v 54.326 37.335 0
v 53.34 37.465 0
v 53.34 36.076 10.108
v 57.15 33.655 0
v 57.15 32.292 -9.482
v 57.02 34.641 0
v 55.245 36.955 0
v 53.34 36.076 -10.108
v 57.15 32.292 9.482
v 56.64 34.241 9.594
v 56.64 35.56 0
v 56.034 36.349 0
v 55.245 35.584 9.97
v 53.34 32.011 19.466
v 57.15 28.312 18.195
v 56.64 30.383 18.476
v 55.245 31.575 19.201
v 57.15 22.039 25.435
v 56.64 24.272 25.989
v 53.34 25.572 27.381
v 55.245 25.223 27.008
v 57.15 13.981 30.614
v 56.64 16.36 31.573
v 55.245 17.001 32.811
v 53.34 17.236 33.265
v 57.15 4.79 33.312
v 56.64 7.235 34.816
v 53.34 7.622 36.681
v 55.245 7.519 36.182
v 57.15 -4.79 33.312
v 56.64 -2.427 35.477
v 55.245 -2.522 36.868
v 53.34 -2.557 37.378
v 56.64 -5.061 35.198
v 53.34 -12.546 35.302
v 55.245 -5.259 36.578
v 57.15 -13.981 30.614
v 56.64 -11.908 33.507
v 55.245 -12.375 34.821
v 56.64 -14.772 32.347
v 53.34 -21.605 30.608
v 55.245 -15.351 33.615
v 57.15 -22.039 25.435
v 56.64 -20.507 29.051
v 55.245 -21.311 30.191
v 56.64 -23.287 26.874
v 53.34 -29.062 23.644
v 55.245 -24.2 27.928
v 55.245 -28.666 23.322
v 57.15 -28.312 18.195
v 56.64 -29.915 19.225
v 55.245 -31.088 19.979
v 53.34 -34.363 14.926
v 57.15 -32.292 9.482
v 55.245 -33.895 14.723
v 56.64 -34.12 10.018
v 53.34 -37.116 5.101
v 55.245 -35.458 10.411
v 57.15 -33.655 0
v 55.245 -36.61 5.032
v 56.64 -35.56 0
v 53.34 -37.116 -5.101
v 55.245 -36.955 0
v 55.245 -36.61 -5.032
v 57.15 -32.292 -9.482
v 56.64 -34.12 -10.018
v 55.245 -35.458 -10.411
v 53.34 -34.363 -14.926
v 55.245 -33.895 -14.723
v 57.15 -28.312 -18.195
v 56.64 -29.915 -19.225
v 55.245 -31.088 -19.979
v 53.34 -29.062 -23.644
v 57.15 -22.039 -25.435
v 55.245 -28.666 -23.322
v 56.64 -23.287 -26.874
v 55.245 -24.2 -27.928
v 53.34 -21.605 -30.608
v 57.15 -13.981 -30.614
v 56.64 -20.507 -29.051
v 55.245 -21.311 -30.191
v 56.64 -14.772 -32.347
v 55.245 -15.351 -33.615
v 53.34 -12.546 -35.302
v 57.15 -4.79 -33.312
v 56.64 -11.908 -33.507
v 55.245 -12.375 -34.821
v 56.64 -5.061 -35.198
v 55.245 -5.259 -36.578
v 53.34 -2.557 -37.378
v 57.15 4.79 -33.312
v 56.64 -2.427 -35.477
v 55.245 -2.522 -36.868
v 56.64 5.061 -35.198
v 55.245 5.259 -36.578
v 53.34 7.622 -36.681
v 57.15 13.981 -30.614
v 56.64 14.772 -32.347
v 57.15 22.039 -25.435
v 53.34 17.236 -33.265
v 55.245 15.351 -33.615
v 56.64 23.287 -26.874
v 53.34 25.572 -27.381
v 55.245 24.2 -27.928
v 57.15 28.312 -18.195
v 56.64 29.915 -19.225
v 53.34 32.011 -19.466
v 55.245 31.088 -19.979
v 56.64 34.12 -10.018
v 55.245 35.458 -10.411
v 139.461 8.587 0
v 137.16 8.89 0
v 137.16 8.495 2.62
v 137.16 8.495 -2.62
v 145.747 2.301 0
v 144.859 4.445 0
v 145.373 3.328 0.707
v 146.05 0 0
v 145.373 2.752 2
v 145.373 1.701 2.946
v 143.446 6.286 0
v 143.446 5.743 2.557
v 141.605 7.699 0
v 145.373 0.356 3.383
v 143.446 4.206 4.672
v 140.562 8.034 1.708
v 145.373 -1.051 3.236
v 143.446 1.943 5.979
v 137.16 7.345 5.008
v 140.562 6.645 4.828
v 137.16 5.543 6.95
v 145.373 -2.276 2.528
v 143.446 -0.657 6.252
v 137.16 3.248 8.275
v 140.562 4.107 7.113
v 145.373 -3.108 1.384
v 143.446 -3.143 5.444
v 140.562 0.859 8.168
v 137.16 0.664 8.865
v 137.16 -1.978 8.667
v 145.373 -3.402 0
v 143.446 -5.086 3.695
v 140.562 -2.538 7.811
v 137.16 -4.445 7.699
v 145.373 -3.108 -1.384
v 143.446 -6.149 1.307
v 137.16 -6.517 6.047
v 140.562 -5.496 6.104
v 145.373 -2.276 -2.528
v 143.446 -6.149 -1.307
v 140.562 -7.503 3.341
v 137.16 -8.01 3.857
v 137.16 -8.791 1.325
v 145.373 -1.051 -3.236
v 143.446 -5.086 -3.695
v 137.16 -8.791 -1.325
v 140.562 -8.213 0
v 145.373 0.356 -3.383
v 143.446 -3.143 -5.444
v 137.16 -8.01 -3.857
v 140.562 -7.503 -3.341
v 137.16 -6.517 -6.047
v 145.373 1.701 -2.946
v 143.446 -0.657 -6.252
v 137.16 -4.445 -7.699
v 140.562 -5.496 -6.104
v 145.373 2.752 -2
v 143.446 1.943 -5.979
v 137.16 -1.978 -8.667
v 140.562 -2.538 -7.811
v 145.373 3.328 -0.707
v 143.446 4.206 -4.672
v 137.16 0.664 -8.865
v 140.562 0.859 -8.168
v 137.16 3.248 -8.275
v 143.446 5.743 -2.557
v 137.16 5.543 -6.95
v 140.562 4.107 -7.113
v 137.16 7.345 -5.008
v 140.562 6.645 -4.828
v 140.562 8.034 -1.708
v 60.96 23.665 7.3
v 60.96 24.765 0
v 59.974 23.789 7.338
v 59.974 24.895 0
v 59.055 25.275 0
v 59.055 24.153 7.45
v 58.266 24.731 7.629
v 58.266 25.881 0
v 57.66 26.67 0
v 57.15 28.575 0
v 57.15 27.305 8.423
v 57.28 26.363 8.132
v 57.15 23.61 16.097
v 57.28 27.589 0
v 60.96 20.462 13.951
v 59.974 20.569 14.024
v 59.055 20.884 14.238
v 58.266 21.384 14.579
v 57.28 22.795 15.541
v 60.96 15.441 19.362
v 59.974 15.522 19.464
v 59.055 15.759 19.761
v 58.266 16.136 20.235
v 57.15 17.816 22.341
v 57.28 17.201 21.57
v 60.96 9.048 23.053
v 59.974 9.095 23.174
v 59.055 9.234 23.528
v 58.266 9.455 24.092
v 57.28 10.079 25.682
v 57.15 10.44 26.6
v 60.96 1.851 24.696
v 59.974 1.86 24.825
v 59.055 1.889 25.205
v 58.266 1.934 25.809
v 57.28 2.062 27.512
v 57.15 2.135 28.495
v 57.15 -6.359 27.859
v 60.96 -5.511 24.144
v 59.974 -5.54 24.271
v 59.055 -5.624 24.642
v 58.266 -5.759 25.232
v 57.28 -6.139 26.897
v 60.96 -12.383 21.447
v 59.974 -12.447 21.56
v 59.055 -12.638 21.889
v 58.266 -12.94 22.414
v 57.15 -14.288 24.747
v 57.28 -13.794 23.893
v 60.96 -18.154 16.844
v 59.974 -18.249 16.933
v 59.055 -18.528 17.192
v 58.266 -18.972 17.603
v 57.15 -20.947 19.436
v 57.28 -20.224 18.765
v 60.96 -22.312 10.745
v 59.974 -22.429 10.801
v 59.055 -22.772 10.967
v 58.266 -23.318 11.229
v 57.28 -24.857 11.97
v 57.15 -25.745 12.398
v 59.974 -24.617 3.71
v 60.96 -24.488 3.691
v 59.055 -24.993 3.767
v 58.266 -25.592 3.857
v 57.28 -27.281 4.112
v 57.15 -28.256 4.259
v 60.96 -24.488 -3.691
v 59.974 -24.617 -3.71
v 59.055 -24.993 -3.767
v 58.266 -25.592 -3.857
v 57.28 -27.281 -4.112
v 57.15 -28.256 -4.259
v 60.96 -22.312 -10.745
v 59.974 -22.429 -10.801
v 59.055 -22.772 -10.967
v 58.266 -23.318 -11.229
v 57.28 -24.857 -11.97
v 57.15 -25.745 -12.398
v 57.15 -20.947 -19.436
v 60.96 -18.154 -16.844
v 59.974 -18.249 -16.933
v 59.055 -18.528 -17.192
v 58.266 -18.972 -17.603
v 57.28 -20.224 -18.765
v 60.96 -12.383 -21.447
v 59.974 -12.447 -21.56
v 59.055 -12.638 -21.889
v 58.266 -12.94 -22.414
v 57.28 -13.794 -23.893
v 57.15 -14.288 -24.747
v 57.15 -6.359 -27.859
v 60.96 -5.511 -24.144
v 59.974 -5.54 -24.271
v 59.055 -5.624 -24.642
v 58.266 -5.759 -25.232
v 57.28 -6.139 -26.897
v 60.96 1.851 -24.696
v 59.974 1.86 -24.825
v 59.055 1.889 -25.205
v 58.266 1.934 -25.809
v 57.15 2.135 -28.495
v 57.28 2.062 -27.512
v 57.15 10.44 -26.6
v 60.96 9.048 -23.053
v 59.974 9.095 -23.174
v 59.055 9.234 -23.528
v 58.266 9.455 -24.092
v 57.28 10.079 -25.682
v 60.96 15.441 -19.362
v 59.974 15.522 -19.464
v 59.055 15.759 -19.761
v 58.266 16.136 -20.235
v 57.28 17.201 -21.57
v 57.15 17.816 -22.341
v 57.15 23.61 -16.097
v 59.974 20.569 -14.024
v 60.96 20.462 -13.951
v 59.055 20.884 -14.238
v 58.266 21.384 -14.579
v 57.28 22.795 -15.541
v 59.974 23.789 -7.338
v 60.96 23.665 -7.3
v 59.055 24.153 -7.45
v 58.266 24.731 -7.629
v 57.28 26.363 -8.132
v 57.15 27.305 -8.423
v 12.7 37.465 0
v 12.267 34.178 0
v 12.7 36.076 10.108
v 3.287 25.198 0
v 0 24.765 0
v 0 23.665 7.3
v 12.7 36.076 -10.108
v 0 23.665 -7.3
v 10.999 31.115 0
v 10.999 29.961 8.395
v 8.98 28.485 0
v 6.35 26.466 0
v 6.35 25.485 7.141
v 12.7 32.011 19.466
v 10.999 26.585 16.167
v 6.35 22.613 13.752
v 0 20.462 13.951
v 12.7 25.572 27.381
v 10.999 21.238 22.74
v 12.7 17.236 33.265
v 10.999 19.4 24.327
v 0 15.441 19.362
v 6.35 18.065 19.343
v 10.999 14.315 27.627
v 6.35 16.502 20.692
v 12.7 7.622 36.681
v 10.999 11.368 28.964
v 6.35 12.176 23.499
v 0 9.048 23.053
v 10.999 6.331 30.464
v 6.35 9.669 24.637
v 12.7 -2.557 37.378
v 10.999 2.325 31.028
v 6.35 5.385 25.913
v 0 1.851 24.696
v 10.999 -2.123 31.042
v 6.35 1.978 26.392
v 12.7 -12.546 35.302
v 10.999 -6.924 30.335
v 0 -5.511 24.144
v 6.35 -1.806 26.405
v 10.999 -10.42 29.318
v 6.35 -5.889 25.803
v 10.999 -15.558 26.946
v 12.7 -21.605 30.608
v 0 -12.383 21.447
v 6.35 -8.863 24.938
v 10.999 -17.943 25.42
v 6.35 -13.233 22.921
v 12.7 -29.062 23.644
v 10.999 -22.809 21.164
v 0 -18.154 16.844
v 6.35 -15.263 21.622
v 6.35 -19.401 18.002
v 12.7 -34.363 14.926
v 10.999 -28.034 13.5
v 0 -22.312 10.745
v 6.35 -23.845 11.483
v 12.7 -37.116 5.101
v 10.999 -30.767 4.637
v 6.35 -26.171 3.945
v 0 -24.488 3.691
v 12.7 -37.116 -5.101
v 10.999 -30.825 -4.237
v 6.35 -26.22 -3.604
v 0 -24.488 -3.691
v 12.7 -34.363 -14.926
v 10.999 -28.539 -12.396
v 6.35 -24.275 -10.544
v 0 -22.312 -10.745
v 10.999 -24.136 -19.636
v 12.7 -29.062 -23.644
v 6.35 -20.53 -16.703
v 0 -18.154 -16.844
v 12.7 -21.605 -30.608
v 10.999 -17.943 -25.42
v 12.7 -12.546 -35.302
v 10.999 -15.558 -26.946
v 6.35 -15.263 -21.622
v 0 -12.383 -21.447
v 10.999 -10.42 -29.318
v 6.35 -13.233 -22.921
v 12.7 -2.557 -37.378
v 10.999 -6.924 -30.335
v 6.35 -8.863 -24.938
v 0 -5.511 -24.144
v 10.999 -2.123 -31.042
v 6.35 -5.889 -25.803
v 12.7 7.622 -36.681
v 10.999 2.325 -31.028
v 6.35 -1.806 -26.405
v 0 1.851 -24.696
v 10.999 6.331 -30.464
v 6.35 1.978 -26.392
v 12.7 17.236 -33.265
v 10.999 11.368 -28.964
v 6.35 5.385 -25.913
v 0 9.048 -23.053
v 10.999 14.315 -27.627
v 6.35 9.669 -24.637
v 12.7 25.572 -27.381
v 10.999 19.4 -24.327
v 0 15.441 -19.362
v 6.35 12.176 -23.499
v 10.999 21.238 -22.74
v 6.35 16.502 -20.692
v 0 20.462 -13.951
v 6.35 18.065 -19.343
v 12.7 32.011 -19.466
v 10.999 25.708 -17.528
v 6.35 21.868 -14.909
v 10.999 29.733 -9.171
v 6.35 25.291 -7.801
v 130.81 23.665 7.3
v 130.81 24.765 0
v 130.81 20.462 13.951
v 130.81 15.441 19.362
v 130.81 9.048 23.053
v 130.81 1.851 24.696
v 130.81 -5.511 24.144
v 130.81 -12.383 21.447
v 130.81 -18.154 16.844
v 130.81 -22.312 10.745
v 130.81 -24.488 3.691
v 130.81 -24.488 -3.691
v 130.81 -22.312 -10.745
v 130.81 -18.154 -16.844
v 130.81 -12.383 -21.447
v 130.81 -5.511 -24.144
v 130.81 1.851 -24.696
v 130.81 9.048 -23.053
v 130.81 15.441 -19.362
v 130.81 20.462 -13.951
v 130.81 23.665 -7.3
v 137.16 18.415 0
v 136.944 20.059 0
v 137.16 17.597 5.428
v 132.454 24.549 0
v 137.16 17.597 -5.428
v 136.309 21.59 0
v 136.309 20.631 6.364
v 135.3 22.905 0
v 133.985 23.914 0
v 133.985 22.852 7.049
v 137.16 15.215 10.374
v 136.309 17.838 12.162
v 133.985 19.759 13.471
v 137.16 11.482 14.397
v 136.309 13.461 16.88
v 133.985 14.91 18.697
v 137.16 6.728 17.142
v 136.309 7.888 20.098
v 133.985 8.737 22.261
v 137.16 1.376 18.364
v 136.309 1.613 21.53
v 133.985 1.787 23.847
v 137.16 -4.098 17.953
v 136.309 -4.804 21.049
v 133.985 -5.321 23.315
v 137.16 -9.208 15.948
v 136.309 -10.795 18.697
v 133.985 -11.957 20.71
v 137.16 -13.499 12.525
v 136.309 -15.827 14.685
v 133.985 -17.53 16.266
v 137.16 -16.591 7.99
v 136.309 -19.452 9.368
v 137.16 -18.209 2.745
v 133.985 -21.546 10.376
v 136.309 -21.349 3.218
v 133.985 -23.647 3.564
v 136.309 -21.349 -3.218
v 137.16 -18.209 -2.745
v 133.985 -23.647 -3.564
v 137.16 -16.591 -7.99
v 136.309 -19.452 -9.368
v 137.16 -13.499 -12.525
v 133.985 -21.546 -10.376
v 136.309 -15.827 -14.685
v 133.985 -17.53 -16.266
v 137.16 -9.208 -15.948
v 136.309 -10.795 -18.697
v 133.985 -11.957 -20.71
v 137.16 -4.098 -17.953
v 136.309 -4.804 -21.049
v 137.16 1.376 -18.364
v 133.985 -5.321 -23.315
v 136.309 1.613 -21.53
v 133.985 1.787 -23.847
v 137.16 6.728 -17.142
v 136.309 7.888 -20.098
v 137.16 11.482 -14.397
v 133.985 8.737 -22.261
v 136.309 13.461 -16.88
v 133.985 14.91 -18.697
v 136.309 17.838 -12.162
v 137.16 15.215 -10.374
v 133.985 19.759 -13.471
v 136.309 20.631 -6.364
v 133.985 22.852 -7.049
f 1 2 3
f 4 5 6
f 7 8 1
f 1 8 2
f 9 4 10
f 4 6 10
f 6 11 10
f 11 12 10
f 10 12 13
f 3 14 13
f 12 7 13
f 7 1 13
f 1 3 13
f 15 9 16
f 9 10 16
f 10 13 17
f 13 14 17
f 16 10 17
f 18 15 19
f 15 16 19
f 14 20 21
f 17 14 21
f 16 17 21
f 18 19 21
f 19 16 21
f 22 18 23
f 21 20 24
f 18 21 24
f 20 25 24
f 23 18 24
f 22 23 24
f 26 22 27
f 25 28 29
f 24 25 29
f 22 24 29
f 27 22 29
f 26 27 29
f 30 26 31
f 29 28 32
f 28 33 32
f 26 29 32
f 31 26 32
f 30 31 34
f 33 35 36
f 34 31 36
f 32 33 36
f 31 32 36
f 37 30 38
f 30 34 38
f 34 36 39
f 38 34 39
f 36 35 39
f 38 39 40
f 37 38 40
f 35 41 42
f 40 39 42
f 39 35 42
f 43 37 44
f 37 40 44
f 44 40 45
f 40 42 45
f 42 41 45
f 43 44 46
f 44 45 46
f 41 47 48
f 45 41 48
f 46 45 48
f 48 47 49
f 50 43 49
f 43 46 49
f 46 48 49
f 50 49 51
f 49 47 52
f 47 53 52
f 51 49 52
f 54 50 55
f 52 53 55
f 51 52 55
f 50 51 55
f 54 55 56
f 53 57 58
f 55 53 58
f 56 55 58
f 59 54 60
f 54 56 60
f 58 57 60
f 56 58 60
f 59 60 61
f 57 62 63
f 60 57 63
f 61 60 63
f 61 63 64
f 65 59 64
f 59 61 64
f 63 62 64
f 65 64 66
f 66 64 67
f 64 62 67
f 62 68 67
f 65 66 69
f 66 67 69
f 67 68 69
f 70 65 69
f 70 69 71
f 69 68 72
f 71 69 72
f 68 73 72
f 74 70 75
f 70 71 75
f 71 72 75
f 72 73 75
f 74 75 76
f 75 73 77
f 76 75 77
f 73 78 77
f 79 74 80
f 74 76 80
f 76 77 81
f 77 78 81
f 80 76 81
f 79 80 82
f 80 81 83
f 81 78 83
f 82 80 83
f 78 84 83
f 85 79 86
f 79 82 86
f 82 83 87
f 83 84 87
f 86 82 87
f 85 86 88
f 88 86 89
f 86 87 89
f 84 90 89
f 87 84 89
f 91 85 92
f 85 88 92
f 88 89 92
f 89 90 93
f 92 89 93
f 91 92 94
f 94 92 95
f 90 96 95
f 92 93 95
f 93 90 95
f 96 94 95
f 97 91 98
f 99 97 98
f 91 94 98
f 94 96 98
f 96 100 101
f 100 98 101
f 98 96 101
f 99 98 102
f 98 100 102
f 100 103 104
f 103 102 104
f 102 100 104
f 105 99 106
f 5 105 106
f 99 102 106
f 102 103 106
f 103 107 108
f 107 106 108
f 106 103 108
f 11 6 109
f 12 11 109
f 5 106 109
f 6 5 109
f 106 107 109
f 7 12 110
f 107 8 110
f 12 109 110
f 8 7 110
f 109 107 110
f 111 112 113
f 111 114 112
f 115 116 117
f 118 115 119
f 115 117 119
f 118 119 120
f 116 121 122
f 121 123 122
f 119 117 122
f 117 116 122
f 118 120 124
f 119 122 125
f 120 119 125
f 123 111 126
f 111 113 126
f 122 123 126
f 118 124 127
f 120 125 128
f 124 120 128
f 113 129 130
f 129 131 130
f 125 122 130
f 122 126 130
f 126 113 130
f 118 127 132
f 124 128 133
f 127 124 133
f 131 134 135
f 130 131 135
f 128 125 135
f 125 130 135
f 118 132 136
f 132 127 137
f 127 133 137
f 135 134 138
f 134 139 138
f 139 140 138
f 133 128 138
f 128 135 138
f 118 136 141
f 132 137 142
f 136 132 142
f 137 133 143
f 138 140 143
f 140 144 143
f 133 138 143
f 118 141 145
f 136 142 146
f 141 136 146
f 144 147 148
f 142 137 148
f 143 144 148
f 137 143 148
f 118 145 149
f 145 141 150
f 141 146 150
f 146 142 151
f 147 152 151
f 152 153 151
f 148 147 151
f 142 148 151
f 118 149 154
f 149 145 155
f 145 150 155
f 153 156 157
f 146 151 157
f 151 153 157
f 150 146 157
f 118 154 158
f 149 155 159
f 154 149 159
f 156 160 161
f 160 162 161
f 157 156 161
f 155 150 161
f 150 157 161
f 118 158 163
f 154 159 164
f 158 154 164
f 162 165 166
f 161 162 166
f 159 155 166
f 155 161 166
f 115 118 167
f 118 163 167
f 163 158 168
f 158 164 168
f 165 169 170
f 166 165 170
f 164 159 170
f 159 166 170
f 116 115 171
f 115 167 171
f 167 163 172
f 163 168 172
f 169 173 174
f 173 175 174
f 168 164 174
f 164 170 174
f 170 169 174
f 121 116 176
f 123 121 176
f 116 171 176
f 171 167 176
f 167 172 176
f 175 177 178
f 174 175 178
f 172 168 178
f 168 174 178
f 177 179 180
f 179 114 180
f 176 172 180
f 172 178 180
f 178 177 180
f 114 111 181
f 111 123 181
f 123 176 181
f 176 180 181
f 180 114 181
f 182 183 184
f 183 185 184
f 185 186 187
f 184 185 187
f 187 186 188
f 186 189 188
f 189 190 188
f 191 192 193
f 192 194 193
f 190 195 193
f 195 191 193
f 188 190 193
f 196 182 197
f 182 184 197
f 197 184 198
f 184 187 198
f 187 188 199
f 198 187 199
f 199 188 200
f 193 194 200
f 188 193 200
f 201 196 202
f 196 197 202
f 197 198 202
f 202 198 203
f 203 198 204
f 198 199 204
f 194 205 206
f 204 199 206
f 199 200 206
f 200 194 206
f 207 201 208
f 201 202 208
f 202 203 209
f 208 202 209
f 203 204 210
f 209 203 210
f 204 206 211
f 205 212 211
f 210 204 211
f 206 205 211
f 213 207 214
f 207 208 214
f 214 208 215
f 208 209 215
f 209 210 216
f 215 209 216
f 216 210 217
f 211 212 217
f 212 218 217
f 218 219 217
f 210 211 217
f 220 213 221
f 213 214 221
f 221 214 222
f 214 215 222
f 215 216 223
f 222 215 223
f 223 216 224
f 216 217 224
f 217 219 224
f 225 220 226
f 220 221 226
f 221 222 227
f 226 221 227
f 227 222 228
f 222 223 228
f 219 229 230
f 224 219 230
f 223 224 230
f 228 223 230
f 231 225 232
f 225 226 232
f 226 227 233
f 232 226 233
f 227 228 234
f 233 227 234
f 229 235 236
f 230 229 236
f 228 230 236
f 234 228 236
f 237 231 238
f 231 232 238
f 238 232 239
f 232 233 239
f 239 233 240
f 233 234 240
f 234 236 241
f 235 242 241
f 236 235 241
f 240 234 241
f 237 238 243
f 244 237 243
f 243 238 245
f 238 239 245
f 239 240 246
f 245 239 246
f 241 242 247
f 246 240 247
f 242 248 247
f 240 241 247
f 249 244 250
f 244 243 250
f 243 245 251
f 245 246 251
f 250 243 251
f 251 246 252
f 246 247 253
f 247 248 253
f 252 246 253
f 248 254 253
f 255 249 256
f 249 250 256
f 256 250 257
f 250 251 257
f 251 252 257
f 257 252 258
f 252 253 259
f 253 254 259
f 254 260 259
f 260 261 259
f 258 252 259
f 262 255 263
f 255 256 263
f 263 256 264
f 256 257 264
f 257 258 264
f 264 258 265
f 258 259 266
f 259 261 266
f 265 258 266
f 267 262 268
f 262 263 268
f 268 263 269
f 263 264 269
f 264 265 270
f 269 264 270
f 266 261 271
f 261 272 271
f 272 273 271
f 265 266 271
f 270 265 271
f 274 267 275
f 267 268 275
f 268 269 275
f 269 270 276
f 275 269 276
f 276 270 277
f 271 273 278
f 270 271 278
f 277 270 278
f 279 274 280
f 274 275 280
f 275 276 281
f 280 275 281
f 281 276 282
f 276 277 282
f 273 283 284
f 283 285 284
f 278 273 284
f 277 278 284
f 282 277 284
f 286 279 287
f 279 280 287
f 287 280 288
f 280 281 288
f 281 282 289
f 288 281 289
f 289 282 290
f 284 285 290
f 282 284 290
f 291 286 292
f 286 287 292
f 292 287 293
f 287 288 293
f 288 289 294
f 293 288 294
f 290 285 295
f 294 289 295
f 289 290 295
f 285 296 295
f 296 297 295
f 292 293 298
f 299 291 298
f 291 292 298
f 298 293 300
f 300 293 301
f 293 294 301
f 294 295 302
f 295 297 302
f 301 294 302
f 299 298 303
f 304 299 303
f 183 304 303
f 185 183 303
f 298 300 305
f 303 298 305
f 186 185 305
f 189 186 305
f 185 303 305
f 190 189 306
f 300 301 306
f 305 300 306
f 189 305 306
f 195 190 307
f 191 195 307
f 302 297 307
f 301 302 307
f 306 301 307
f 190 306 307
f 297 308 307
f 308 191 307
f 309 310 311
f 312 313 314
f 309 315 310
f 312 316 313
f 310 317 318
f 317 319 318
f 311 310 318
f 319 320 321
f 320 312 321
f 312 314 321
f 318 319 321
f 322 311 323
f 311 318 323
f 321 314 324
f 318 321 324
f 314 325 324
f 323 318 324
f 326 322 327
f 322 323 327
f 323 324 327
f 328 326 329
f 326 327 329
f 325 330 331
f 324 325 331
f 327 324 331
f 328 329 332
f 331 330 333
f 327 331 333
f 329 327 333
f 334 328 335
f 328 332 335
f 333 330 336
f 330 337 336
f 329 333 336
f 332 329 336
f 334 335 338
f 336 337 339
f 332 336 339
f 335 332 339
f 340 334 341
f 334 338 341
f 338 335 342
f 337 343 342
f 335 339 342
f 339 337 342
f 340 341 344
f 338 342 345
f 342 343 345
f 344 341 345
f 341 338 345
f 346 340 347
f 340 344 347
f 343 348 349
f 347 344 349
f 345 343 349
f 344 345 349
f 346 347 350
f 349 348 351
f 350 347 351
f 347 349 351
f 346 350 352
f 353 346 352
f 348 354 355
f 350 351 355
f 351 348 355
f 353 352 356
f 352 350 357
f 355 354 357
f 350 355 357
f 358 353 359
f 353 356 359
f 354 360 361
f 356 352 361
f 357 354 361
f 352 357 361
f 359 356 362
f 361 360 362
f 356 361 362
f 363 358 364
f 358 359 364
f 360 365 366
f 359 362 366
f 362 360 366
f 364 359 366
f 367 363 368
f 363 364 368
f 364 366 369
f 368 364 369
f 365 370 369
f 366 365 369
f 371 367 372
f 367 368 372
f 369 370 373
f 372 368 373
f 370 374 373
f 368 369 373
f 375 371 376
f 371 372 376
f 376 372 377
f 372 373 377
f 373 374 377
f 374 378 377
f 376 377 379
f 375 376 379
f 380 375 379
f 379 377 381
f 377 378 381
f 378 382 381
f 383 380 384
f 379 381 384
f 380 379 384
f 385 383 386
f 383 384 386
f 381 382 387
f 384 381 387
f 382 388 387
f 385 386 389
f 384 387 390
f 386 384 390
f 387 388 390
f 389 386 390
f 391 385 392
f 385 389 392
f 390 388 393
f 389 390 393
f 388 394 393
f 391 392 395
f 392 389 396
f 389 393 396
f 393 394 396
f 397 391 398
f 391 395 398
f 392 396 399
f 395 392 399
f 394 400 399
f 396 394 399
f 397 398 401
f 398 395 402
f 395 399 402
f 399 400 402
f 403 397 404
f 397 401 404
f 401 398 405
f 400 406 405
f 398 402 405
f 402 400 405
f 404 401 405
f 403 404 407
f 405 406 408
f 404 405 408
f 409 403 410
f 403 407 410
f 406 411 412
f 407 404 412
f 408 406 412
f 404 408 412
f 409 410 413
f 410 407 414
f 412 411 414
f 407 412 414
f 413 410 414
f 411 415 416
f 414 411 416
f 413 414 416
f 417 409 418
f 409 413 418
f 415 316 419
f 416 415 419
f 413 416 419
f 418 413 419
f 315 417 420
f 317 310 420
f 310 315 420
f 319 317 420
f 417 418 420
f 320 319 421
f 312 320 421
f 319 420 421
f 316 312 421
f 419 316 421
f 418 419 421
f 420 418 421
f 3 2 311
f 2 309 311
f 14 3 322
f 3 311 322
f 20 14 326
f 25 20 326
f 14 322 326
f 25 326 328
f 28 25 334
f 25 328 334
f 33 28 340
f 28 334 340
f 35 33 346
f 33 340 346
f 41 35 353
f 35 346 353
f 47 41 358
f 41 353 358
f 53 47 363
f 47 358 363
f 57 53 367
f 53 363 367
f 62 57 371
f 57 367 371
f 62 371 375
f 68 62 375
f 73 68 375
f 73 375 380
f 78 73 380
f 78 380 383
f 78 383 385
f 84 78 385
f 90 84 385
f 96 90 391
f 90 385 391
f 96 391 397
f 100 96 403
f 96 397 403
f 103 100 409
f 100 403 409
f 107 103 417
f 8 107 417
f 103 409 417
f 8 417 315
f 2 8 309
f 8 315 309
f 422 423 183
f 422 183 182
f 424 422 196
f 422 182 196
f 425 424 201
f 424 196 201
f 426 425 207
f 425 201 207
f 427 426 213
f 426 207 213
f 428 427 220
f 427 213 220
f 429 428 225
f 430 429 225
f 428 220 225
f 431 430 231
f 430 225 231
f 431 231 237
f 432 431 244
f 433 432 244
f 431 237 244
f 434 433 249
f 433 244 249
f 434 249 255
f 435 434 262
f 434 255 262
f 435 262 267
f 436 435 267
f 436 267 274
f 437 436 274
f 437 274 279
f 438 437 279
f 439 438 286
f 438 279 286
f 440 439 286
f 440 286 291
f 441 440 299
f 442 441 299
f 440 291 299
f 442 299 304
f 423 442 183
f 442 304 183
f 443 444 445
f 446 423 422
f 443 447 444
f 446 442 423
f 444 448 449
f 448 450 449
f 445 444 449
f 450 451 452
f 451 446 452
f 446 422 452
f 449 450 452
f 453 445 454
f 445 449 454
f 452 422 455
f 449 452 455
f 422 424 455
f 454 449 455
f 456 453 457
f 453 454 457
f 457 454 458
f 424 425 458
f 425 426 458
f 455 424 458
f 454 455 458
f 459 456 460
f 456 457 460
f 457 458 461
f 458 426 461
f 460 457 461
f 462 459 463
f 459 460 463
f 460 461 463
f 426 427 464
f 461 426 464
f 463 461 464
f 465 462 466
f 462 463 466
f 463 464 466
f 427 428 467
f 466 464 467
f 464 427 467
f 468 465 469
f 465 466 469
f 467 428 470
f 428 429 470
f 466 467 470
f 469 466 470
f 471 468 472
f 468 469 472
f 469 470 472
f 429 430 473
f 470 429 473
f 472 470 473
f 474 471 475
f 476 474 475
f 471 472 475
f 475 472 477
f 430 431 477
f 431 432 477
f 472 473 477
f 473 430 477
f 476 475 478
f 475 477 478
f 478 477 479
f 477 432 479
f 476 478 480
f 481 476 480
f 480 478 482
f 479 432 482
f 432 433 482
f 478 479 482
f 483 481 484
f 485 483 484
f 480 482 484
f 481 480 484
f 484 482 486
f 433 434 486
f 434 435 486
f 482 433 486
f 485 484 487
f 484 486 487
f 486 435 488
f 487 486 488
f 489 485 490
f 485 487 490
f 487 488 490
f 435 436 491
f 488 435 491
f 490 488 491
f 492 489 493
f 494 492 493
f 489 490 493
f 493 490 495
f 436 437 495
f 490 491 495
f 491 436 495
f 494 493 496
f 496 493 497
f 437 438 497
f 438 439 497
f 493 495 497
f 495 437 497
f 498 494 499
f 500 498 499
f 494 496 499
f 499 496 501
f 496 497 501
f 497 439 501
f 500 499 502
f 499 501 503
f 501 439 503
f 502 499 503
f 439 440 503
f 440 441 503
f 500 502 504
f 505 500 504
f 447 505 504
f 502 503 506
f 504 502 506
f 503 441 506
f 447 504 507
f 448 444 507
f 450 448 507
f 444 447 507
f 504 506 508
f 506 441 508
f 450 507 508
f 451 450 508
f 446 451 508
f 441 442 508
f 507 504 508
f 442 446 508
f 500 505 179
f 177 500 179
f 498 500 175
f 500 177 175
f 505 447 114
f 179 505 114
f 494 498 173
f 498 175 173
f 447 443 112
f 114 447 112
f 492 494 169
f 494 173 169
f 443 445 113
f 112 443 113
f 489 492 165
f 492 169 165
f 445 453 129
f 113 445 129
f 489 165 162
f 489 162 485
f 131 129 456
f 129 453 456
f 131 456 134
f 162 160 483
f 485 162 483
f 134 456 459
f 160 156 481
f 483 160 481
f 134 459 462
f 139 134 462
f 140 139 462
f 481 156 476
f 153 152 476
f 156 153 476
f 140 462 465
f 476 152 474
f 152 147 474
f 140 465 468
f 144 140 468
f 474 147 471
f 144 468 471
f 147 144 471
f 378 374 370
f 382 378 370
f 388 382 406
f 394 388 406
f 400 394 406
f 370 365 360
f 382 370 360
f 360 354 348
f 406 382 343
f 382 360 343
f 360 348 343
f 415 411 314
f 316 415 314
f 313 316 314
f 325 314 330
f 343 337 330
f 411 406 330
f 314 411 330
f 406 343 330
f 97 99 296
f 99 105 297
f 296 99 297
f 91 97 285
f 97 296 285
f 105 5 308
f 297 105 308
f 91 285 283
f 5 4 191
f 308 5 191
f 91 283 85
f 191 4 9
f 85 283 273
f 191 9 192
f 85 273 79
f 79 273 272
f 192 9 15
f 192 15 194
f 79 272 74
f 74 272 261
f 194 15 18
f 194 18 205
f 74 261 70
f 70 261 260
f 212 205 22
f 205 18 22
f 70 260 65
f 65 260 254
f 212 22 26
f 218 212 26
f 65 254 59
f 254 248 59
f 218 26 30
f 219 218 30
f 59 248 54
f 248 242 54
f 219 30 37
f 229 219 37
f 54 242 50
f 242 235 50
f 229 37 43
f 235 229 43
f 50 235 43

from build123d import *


with BuildPart() as part:
    # Sketch1 → Revolve5 (revolve)
    with BuildSketch(Plane.XY):
        with BuildLine():
            Line((0, 0), (146.05, 0))
            ThreePointArc((146.05, 0), (143.446179285, 6.286179285), (137.16, 8.89))
            Line((137.16, 8.89), (137.16, 18.415))
            ThreePointArc((137.16, 18.415), (135.300128061, 22.905128061), (130.81, 24.765))
            Line((130.81, 24.765), (60.96, 24.765))
            ThreePointArc((60.96, 24.765), (58.265923164, 25.880923164), (57.15, 28.575))
            Line((57.15, 28.575), (57.15, 33.655))
            ThreePointArc((57.15, 33.655), (56.034076836, 36.349076836), (53.34, 37.465))
            Line((53.34, 37.465), (12.7, 37.465))
            ThreePointArc((12.7, 37.465), (8.980256121, 28.484743879), (0, 24.765))
            Line((0, 24.765), (0, 0))
        make_face()
    revolve(axis=Axis((0, 0, 0), (1, 0, 0)))


solid = part.part
